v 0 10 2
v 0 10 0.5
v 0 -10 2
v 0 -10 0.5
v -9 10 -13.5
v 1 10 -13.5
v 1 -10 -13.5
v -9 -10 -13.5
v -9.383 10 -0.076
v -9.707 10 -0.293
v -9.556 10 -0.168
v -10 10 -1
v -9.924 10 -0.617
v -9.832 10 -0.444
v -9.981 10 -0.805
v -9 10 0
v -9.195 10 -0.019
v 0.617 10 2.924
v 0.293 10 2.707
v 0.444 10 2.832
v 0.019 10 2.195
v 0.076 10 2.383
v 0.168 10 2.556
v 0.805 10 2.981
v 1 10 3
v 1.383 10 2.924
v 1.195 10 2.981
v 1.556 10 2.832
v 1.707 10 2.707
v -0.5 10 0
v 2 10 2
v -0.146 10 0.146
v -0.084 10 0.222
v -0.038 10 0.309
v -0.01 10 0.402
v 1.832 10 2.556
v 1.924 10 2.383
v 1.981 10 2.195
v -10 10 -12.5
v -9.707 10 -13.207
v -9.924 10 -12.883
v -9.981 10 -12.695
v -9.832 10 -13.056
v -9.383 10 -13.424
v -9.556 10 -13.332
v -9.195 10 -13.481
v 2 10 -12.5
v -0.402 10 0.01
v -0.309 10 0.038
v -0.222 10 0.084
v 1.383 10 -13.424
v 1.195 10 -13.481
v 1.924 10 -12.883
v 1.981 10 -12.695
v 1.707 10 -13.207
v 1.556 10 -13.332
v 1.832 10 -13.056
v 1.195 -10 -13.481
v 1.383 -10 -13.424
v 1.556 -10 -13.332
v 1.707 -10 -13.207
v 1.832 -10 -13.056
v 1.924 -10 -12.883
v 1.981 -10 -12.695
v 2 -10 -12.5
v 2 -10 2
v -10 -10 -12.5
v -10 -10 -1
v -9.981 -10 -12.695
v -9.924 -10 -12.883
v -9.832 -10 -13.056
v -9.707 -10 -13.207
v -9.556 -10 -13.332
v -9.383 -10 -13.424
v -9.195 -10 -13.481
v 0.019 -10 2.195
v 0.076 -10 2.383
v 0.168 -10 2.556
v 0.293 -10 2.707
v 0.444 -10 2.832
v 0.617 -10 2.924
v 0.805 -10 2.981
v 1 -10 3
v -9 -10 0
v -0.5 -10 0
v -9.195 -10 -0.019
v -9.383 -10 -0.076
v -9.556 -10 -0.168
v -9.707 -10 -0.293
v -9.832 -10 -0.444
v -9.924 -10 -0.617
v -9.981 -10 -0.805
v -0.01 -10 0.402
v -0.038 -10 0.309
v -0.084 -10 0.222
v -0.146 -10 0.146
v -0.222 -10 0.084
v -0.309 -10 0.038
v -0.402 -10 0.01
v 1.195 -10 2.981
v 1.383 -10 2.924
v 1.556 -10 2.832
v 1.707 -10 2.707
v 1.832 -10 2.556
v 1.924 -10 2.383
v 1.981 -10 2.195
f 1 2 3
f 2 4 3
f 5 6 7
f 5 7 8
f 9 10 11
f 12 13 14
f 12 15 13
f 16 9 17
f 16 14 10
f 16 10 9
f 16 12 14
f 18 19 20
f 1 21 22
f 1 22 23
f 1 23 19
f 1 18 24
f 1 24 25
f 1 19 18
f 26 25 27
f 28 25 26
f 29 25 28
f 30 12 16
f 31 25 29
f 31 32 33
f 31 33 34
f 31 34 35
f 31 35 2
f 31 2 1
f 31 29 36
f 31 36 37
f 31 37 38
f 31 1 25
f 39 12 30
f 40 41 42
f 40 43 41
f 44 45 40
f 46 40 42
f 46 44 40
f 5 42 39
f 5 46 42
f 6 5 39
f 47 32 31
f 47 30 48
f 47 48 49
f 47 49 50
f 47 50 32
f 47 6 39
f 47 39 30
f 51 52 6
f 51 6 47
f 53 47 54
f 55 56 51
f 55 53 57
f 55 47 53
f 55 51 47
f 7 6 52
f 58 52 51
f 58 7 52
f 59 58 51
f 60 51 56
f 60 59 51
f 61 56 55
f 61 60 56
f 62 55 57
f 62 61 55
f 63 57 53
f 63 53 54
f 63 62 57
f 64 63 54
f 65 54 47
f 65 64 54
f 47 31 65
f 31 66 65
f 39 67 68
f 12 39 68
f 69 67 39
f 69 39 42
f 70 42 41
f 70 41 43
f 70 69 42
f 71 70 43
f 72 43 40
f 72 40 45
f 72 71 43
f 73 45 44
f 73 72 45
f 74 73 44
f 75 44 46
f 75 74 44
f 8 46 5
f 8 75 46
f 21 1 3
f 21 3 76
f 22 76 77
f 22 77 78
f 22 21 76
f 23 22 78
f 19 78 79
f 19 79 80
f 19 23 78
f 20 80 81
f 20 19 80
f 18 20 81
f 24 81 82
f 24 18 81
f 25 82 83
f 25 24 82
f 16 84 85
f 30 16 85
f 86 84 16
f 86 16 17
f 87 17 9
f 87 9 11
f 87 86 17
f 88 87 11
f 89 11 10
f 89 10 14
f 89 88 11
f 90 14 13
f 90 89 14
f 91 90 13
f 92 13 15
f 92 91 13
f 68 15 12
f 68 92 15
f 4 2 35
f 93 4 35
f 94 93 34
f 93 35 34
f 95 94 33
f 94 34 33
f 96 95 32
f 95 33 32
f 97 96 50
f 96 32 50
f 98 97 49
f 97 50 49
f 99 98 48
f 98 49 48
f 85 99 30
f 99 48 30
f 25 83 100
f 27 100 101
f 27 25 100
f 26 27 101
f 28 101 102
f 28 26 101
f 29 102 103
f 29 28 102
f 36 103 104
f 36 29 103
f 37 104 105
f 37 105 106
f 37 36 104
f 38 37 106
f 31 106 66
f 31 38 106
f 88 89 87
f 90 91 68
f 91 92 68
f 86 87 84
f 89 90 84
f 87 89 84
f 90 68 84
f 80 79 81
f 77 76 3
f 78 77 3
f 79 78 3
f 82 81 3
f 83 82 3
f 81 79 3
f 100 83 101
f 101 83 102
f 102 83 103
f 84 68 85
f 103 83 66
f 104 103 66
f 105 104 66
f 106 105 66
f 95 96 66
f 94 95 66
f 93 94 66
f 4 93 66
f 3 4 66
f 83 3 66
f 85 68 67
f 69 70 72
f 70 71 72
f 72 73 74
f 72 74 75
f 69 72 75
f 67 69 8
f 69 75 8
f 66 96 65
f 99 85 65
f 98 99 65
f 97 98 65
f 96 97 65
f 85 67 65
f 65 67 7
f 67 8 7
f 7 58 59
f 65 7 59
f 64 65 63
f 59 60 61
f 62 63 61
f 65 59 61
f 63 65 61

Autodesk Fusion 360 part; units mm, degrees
sketch "Sketch1" plane through (0, 0, 0) normal (0, 1, 0) x (1, 0, 0)
  line L0 (0, 0) -> (0, -3)
  line L1 (0, -3) -> (2, -3)
  line L2 (2, -3) -> (2, 13.5)
  line L3 (2, 13.5) -> (-10, 13.5)
  line L4 (-10, 13.5) -> (-10, 0)
  line L5 (-10, 0) -> (0, 0)
  dimension "d1" = 3
  dimension "d2" = 10
  dimension "d4" = 13.5
  dimension "d5" = 2
extrude "Extrude1" add sketch "Sketch1" along normal mid plane 20
fillet "Fillet1" radius 1 5 edges at (2, 0, -13.5) (-10, 0, -13.5) (-10, 0, 0) (2, 0, 3) (0, 0, 3)
fillet "Fillet2" radius 0.5 1 edges at (0, 0, 0)
